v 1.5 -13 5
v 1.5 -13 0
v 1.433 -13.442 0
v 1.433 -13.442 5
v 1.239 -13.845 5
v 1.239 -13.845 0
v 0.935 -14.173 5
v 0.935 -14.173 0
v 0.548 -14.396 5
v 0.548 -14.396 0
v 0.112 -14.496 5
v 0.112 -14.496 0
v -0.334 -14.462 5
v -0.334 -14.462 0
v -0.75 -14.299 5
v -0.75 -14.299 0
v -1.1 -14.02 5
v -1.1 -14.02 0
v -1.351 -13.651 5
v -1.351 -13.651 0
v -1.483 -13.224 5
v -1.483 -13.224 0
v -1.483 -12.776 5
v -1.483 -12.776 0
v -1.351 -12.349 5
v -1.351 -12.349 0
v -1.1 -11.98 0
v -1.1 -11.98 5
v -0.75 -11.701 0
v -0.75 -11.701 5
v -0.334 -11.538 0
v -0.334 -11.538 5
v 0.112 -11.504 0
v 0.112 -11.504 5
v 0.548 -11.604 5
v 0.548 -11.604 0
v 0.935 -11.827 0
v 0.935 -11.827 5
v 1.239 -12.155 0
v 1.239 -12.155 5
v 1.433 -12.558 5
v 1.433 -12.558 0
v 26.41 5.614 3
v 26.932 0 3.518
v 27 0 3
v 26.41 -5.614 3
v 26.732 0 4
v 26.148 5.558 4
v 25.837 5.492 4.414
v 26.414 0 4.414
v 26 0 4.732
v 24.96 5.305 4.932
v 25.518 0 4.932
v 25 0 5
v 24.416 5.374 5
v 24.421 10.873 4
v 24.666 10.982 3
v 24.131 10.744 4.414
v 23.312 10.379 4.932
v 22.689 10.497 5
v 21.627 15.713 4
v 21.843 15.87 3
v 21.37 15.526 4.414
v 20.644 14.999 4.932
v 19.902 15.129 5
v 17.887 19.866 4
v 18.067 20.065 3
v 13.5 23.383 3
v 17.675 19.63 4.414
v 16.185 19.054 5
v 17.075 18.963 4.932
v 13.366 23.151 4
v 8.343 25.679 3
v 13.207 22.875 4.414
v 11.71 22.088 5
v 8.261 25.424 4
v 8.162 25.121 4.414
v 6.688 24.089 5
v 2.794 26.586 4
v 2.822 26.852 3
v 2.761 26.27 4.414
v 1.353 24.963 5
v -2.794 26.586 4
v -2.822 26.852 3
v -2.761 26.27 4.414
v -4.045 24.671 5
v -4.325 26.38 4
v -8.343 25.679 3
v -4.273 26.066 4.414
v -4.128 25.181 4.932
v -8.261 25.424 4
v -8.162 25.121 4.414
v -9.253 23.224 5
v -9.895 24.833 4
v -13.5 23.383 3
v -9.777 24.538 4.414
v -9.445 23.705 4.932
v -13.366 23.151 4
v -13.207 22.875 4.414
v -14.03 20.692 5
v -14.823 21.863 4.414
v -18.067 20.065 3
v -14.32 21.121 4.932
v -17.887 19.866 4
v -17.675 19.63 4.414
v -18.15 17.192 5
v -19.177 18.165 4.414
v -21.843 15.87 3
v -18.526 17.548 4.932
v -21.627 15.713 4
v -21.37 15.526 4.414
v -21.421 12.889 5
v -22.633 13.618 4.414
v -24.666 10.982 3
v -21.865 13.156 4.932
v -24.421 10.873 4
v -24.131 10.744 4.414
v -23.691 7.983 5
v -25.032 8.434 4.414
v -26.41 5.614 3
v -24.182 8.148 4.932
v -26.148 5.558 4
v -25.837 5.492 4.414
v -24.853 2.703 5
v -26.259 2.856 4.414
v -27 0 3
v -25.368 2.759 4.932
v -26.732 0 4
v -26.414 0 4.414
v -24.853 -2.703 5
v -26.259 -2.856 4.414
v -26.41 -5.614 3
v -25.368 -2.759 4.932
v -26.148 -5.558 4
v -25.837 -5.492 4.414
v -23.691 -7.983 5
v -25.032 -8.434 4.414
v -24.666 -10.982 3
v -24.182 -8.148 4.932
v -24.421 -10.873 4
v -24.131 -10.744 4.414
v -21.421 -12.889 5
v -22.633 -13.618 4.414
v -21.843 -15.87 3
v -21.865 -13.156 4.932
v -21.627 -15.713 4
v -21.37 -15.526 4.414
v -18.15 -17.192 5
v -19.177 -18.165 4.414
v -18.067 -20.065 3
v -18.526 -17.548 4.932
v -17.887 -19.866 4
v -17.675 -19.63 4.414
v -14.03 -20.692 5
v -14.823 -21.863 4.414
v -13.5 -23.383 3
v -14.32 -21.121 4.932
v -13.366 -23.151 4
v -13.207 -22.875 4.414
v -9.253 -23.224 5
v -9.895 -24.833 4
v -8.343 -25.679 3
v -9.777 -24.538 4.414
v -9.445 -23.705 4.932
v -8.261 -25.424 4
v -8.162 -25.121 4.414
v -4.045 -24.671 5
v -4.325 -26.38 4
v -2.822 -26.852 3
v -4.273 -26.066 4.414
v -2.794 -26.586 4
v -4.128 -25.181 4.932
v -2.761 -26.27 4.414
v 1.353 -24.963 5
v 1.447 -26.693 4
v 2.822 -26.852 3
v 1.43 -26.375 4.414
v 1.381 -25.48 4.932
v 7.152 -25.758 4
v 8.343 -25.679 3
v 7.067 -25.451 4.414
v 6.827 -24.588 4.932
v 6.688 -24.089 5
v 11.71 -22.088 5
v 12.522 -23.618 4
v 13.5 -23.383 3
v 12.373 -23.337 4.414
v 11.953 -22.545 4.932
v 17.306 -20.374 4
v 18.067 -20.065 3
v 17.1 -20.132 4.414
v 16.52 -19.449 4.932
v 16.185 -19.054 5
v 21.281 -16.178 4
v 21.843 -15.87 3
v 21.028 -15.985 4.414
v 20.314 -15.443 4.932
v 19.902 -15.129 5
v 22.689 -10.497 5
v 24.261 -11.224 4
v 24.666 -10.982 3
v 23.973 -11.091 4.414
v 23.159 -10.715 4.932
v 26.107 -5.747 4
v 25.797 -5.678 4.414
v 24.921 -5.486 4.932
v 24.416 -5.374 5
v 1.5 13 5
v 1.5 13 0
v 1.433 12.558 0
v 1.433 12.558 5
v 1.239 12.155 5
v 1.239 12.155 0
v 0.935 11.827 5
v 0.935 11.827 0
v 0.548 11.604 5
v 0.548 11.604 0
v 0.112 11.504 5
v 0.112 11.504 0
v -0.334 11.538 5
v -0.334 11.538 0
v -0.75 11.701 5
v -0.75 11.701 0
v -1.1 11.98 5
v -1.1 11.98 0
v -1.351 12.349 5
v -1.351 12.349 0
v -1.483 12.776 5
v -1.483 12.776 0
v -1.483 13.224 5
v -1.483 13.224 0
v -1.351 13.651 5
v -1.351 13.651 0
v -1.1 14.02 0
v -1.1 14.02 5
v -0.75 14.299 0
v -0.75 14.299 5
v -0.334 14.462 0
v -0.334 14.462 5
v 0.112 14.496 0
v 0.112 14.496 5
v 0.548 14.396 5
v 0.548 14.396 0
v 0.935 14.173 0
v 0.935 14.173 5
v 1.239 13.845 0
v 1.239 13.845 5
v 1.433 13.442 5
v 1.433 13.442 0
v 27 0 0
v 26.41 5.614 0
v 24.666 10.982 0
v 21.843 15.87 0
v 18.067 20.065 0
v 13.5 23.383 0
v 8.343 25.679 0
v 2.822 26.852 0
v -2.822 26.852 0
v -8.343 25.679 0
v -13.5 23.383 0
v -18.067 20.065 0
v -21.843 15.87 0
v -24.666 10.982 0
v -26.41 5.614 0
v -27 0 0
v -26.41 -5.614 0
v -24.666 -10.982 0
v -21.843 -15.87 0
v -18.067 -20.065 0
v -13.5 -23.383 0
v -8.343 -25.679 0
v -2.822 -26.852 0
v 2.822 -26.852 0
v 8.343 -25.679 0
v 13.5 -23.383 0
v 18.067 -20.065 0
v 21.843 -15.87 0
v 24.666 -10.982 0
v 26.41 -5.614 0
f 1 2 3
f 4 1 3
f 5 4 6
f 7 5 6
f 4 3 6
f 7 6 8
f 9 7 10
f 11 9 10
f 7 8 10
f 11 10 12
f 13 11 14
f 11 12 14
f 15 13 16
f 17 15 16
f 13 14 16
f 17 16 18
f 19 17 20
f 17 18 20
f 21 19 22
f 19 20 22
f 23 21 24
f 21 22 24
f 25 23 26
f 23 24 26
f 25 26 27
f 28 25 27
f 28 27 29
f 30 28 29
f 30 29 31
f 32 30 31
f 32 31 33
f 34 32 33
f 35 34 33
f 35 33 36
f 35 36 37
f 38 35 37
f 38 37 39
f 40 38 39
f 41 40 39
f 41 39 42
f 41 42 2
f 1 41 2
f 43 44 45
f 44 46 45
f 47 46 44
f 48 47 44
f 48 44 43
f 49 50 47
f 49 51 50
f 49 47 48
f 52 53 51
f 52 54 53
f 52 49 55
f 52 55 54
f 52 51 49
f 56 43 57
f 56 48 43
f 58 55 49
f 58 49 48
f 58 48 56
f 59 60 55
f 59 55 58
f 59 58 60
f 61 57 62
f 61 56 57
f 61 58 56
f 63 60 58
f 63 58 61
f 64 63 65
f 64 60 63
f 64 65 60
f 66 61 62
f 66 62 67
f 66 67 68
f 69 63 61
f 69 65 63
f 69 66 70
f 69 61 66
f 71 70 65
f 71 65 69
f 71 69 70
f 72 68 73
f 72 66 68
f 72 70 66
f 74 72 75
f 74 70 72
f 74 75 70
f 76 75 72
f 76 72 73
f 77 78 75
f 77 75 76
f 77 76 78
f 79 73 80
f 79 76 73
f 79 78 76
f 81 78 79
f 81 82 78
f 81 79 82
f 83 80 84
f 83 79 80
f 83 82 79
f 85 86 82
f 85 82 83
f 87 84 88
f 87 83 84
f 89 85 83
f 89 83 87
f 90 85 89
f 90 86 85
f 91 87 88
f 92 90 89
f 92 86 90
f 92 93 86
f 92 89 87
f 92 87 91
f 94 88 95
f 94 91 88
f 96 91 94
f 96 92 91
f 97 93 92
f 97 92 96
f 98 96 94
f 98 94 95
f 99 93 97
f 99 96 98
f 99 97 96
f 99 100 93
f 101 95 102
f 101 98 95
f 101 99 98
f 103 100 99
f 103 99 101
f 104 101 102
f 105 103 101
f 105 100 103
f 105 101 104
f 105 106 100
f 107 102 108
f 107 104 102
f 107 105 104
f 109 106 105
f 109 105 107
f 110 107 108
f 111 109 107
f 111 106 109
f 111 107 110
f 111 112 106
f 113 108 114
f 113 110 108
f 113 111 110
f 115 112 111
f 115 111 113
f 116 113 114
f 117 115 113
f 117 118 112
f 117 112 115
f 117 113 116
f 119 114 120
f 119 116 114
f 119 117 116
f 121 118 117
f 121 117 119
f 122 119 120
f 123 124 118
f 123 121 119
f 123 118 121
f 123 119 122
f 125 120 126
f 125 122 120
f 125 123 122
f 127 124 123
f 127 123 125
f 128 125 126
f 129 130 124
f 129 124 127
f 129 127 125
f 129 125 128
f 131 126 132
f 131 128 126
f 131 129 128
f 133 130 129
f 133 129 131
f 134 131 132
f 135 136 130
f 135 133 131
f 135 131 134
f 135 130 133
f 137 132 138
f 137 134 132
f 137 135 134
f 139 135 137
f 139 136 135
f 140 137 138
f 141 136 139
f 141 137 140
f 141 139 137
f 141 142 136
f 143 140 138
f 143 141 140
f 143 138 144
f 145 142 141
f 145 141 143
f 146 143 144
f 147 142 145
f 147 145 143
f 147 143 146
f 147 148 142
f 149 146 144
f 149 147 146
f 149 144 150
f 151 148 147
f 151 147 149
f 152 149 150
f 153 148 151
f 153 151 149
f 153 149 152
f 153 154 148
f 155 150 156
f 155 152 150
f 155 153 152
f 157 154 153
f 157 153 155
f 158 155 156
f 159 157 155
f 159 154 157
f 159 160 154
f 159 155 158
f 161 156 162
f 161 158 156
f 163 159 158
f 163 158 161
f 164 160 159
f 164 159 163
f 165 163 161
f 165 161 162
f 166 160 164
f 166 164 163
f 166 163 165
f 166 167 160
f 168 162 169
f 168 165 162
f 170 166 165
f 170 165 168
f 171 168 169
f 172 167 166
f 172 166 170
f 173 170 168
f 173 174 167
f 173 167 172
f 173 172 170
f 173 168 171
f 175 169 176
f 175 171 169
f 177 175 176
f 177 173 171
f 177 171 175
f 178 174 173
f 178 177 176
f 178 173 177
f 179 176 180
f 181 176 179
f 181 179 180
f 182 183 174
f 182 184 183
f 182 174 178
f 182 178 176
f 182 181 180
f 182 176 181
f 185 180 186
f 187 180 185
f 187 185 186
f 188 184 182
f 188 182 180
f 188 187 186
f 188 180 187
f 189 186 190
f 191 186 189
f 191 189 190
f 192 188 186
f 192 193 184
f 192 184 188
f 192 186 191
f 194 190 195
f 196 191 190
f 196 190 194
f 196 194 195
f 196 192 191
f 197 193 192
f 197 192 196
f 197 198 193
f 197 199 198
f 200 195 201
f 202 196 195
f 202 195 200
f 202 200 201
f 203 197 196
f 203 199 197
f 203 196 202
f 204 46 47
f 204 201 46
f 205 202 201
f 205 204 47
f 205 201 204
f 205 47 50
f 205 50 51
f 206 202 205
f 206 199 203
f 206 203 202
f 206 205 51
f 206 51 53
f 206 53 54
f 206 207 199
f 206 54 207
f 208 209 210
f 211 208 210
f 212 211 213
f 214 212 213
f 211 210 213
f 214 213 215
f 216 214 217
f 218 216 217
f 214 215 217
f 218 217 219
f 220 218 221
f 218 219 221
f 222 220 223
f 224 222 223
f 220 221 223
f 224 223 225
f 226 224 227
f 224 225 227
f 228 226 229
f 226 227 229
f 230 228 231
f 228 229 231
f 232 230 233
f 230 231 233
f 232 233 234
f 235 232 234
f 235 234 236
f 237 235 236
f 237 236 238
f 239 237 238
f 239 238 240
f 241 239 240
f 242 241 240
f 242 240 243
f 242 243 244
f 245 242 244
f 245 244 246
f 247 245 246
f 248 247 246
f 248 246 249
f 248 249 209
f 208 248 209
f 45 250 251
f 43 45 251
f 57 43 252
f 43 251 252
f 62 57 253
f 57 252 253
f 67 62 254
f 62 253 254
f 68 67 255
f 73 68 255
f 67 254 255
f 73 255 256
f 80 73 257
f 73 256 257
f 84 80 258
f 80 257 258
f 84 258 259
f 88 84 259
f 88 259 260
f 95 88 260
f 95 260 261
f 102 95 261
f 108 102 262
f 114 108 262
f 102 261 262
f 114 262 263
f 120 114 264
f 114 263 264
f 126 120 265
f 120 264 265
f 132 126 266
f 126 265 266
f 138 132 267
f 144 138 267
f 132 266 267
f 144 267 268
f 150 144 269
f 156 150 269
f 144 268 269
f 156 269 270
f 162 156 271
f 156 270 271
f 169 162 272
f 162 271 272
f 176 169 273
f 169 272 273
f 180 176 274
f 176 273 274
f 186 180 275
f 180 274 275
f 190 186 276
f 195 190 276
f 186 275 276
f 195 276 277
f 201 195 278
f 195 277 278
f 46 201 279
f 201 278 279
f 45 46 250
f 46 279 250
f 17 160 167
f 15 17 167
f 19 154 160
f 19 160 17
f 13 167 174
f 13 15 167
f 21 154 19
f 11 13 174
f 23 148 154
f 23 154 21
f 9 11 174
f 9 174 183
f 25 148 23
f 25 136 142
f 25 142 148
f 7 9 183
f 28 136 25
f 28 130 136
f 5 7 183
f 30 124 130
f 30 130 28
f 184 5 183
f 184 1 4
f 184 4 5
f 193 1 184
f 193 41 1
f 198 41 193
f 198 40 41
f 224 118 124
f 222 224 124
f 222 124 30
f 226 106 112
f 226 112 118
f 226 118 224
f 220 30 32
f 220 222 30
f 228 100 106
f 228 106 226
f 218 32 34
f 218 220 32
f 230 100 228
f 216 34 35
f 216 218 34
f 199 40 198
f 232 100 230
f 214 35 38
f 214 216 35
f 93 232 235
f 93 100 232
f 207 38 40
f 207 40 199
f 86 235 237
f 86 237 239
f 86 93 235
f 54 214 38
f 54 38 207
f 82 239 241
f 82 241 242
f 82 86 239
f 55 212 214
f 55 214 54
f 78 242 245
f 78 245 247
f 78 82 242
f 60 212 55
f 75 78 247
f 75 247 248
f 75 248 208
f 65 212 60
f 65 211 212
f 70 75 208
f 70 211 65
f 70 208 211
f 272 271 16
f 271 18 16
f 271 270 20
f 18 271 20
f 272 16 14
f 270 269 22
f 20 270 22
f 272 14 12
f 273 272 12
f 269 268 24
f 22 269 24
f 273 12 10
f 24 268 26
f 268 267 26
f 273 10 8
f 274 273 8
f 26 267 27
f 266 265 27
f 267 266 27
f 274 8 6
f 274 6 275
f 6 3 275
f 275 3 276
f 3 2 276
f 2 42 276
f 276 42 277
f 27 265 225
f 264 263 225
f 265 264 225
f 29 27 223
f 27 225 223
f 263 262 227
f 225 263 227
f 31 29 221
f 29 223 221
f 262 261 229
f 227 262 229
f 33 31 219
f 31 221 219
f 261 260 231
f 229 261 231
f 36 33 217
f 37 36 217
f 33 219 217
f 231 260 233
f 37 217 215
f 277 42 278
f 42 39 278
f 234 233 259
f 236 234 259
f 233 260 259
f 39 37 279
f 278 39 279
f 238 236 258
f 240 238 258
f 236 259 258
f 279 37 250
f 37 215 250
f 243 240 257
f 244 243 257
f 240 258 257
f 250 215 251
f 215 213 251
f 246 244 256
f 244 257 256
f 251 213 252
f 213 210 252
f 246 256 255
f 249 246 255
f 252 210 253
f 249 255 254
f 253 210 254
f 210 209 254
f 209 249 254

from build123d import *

# Parameters (mm, degrees)
F0_R     = 27
F1_DEPTH = 5
F2_R     = 2
F3_R     = 1.5
F4_DEPTH = 5.001


with BuildPart() as f1:
    # F0 (on Top) → F1 (new body)
    with BuildSketch(Plane.XY):
        Circle(F0_R)
    extrude(amount=F1_DEPTH)

    # F2
    f2_edges = [f1.edges().sort_by_distance(p)[0] for p in [
        (-27, 0, 5),
    ]]
    fillet(f2_edges, radius=F2_R)

    # F3 (on face) → F4 (cut, through all)
    with BuildSketch(Plane(origin=(0, 0, 0), x_dir=(1, 0, 0), z_dir=(0, 0, -1))):
        with Locations((0, 13)):
            Circle(F3_R)
        with Locations((0, -13)):
            Circle(F3_R)
    extrude(amount=-F4_DEPTH, mode=Mode.SUBTRACT)


solid = f1.part
